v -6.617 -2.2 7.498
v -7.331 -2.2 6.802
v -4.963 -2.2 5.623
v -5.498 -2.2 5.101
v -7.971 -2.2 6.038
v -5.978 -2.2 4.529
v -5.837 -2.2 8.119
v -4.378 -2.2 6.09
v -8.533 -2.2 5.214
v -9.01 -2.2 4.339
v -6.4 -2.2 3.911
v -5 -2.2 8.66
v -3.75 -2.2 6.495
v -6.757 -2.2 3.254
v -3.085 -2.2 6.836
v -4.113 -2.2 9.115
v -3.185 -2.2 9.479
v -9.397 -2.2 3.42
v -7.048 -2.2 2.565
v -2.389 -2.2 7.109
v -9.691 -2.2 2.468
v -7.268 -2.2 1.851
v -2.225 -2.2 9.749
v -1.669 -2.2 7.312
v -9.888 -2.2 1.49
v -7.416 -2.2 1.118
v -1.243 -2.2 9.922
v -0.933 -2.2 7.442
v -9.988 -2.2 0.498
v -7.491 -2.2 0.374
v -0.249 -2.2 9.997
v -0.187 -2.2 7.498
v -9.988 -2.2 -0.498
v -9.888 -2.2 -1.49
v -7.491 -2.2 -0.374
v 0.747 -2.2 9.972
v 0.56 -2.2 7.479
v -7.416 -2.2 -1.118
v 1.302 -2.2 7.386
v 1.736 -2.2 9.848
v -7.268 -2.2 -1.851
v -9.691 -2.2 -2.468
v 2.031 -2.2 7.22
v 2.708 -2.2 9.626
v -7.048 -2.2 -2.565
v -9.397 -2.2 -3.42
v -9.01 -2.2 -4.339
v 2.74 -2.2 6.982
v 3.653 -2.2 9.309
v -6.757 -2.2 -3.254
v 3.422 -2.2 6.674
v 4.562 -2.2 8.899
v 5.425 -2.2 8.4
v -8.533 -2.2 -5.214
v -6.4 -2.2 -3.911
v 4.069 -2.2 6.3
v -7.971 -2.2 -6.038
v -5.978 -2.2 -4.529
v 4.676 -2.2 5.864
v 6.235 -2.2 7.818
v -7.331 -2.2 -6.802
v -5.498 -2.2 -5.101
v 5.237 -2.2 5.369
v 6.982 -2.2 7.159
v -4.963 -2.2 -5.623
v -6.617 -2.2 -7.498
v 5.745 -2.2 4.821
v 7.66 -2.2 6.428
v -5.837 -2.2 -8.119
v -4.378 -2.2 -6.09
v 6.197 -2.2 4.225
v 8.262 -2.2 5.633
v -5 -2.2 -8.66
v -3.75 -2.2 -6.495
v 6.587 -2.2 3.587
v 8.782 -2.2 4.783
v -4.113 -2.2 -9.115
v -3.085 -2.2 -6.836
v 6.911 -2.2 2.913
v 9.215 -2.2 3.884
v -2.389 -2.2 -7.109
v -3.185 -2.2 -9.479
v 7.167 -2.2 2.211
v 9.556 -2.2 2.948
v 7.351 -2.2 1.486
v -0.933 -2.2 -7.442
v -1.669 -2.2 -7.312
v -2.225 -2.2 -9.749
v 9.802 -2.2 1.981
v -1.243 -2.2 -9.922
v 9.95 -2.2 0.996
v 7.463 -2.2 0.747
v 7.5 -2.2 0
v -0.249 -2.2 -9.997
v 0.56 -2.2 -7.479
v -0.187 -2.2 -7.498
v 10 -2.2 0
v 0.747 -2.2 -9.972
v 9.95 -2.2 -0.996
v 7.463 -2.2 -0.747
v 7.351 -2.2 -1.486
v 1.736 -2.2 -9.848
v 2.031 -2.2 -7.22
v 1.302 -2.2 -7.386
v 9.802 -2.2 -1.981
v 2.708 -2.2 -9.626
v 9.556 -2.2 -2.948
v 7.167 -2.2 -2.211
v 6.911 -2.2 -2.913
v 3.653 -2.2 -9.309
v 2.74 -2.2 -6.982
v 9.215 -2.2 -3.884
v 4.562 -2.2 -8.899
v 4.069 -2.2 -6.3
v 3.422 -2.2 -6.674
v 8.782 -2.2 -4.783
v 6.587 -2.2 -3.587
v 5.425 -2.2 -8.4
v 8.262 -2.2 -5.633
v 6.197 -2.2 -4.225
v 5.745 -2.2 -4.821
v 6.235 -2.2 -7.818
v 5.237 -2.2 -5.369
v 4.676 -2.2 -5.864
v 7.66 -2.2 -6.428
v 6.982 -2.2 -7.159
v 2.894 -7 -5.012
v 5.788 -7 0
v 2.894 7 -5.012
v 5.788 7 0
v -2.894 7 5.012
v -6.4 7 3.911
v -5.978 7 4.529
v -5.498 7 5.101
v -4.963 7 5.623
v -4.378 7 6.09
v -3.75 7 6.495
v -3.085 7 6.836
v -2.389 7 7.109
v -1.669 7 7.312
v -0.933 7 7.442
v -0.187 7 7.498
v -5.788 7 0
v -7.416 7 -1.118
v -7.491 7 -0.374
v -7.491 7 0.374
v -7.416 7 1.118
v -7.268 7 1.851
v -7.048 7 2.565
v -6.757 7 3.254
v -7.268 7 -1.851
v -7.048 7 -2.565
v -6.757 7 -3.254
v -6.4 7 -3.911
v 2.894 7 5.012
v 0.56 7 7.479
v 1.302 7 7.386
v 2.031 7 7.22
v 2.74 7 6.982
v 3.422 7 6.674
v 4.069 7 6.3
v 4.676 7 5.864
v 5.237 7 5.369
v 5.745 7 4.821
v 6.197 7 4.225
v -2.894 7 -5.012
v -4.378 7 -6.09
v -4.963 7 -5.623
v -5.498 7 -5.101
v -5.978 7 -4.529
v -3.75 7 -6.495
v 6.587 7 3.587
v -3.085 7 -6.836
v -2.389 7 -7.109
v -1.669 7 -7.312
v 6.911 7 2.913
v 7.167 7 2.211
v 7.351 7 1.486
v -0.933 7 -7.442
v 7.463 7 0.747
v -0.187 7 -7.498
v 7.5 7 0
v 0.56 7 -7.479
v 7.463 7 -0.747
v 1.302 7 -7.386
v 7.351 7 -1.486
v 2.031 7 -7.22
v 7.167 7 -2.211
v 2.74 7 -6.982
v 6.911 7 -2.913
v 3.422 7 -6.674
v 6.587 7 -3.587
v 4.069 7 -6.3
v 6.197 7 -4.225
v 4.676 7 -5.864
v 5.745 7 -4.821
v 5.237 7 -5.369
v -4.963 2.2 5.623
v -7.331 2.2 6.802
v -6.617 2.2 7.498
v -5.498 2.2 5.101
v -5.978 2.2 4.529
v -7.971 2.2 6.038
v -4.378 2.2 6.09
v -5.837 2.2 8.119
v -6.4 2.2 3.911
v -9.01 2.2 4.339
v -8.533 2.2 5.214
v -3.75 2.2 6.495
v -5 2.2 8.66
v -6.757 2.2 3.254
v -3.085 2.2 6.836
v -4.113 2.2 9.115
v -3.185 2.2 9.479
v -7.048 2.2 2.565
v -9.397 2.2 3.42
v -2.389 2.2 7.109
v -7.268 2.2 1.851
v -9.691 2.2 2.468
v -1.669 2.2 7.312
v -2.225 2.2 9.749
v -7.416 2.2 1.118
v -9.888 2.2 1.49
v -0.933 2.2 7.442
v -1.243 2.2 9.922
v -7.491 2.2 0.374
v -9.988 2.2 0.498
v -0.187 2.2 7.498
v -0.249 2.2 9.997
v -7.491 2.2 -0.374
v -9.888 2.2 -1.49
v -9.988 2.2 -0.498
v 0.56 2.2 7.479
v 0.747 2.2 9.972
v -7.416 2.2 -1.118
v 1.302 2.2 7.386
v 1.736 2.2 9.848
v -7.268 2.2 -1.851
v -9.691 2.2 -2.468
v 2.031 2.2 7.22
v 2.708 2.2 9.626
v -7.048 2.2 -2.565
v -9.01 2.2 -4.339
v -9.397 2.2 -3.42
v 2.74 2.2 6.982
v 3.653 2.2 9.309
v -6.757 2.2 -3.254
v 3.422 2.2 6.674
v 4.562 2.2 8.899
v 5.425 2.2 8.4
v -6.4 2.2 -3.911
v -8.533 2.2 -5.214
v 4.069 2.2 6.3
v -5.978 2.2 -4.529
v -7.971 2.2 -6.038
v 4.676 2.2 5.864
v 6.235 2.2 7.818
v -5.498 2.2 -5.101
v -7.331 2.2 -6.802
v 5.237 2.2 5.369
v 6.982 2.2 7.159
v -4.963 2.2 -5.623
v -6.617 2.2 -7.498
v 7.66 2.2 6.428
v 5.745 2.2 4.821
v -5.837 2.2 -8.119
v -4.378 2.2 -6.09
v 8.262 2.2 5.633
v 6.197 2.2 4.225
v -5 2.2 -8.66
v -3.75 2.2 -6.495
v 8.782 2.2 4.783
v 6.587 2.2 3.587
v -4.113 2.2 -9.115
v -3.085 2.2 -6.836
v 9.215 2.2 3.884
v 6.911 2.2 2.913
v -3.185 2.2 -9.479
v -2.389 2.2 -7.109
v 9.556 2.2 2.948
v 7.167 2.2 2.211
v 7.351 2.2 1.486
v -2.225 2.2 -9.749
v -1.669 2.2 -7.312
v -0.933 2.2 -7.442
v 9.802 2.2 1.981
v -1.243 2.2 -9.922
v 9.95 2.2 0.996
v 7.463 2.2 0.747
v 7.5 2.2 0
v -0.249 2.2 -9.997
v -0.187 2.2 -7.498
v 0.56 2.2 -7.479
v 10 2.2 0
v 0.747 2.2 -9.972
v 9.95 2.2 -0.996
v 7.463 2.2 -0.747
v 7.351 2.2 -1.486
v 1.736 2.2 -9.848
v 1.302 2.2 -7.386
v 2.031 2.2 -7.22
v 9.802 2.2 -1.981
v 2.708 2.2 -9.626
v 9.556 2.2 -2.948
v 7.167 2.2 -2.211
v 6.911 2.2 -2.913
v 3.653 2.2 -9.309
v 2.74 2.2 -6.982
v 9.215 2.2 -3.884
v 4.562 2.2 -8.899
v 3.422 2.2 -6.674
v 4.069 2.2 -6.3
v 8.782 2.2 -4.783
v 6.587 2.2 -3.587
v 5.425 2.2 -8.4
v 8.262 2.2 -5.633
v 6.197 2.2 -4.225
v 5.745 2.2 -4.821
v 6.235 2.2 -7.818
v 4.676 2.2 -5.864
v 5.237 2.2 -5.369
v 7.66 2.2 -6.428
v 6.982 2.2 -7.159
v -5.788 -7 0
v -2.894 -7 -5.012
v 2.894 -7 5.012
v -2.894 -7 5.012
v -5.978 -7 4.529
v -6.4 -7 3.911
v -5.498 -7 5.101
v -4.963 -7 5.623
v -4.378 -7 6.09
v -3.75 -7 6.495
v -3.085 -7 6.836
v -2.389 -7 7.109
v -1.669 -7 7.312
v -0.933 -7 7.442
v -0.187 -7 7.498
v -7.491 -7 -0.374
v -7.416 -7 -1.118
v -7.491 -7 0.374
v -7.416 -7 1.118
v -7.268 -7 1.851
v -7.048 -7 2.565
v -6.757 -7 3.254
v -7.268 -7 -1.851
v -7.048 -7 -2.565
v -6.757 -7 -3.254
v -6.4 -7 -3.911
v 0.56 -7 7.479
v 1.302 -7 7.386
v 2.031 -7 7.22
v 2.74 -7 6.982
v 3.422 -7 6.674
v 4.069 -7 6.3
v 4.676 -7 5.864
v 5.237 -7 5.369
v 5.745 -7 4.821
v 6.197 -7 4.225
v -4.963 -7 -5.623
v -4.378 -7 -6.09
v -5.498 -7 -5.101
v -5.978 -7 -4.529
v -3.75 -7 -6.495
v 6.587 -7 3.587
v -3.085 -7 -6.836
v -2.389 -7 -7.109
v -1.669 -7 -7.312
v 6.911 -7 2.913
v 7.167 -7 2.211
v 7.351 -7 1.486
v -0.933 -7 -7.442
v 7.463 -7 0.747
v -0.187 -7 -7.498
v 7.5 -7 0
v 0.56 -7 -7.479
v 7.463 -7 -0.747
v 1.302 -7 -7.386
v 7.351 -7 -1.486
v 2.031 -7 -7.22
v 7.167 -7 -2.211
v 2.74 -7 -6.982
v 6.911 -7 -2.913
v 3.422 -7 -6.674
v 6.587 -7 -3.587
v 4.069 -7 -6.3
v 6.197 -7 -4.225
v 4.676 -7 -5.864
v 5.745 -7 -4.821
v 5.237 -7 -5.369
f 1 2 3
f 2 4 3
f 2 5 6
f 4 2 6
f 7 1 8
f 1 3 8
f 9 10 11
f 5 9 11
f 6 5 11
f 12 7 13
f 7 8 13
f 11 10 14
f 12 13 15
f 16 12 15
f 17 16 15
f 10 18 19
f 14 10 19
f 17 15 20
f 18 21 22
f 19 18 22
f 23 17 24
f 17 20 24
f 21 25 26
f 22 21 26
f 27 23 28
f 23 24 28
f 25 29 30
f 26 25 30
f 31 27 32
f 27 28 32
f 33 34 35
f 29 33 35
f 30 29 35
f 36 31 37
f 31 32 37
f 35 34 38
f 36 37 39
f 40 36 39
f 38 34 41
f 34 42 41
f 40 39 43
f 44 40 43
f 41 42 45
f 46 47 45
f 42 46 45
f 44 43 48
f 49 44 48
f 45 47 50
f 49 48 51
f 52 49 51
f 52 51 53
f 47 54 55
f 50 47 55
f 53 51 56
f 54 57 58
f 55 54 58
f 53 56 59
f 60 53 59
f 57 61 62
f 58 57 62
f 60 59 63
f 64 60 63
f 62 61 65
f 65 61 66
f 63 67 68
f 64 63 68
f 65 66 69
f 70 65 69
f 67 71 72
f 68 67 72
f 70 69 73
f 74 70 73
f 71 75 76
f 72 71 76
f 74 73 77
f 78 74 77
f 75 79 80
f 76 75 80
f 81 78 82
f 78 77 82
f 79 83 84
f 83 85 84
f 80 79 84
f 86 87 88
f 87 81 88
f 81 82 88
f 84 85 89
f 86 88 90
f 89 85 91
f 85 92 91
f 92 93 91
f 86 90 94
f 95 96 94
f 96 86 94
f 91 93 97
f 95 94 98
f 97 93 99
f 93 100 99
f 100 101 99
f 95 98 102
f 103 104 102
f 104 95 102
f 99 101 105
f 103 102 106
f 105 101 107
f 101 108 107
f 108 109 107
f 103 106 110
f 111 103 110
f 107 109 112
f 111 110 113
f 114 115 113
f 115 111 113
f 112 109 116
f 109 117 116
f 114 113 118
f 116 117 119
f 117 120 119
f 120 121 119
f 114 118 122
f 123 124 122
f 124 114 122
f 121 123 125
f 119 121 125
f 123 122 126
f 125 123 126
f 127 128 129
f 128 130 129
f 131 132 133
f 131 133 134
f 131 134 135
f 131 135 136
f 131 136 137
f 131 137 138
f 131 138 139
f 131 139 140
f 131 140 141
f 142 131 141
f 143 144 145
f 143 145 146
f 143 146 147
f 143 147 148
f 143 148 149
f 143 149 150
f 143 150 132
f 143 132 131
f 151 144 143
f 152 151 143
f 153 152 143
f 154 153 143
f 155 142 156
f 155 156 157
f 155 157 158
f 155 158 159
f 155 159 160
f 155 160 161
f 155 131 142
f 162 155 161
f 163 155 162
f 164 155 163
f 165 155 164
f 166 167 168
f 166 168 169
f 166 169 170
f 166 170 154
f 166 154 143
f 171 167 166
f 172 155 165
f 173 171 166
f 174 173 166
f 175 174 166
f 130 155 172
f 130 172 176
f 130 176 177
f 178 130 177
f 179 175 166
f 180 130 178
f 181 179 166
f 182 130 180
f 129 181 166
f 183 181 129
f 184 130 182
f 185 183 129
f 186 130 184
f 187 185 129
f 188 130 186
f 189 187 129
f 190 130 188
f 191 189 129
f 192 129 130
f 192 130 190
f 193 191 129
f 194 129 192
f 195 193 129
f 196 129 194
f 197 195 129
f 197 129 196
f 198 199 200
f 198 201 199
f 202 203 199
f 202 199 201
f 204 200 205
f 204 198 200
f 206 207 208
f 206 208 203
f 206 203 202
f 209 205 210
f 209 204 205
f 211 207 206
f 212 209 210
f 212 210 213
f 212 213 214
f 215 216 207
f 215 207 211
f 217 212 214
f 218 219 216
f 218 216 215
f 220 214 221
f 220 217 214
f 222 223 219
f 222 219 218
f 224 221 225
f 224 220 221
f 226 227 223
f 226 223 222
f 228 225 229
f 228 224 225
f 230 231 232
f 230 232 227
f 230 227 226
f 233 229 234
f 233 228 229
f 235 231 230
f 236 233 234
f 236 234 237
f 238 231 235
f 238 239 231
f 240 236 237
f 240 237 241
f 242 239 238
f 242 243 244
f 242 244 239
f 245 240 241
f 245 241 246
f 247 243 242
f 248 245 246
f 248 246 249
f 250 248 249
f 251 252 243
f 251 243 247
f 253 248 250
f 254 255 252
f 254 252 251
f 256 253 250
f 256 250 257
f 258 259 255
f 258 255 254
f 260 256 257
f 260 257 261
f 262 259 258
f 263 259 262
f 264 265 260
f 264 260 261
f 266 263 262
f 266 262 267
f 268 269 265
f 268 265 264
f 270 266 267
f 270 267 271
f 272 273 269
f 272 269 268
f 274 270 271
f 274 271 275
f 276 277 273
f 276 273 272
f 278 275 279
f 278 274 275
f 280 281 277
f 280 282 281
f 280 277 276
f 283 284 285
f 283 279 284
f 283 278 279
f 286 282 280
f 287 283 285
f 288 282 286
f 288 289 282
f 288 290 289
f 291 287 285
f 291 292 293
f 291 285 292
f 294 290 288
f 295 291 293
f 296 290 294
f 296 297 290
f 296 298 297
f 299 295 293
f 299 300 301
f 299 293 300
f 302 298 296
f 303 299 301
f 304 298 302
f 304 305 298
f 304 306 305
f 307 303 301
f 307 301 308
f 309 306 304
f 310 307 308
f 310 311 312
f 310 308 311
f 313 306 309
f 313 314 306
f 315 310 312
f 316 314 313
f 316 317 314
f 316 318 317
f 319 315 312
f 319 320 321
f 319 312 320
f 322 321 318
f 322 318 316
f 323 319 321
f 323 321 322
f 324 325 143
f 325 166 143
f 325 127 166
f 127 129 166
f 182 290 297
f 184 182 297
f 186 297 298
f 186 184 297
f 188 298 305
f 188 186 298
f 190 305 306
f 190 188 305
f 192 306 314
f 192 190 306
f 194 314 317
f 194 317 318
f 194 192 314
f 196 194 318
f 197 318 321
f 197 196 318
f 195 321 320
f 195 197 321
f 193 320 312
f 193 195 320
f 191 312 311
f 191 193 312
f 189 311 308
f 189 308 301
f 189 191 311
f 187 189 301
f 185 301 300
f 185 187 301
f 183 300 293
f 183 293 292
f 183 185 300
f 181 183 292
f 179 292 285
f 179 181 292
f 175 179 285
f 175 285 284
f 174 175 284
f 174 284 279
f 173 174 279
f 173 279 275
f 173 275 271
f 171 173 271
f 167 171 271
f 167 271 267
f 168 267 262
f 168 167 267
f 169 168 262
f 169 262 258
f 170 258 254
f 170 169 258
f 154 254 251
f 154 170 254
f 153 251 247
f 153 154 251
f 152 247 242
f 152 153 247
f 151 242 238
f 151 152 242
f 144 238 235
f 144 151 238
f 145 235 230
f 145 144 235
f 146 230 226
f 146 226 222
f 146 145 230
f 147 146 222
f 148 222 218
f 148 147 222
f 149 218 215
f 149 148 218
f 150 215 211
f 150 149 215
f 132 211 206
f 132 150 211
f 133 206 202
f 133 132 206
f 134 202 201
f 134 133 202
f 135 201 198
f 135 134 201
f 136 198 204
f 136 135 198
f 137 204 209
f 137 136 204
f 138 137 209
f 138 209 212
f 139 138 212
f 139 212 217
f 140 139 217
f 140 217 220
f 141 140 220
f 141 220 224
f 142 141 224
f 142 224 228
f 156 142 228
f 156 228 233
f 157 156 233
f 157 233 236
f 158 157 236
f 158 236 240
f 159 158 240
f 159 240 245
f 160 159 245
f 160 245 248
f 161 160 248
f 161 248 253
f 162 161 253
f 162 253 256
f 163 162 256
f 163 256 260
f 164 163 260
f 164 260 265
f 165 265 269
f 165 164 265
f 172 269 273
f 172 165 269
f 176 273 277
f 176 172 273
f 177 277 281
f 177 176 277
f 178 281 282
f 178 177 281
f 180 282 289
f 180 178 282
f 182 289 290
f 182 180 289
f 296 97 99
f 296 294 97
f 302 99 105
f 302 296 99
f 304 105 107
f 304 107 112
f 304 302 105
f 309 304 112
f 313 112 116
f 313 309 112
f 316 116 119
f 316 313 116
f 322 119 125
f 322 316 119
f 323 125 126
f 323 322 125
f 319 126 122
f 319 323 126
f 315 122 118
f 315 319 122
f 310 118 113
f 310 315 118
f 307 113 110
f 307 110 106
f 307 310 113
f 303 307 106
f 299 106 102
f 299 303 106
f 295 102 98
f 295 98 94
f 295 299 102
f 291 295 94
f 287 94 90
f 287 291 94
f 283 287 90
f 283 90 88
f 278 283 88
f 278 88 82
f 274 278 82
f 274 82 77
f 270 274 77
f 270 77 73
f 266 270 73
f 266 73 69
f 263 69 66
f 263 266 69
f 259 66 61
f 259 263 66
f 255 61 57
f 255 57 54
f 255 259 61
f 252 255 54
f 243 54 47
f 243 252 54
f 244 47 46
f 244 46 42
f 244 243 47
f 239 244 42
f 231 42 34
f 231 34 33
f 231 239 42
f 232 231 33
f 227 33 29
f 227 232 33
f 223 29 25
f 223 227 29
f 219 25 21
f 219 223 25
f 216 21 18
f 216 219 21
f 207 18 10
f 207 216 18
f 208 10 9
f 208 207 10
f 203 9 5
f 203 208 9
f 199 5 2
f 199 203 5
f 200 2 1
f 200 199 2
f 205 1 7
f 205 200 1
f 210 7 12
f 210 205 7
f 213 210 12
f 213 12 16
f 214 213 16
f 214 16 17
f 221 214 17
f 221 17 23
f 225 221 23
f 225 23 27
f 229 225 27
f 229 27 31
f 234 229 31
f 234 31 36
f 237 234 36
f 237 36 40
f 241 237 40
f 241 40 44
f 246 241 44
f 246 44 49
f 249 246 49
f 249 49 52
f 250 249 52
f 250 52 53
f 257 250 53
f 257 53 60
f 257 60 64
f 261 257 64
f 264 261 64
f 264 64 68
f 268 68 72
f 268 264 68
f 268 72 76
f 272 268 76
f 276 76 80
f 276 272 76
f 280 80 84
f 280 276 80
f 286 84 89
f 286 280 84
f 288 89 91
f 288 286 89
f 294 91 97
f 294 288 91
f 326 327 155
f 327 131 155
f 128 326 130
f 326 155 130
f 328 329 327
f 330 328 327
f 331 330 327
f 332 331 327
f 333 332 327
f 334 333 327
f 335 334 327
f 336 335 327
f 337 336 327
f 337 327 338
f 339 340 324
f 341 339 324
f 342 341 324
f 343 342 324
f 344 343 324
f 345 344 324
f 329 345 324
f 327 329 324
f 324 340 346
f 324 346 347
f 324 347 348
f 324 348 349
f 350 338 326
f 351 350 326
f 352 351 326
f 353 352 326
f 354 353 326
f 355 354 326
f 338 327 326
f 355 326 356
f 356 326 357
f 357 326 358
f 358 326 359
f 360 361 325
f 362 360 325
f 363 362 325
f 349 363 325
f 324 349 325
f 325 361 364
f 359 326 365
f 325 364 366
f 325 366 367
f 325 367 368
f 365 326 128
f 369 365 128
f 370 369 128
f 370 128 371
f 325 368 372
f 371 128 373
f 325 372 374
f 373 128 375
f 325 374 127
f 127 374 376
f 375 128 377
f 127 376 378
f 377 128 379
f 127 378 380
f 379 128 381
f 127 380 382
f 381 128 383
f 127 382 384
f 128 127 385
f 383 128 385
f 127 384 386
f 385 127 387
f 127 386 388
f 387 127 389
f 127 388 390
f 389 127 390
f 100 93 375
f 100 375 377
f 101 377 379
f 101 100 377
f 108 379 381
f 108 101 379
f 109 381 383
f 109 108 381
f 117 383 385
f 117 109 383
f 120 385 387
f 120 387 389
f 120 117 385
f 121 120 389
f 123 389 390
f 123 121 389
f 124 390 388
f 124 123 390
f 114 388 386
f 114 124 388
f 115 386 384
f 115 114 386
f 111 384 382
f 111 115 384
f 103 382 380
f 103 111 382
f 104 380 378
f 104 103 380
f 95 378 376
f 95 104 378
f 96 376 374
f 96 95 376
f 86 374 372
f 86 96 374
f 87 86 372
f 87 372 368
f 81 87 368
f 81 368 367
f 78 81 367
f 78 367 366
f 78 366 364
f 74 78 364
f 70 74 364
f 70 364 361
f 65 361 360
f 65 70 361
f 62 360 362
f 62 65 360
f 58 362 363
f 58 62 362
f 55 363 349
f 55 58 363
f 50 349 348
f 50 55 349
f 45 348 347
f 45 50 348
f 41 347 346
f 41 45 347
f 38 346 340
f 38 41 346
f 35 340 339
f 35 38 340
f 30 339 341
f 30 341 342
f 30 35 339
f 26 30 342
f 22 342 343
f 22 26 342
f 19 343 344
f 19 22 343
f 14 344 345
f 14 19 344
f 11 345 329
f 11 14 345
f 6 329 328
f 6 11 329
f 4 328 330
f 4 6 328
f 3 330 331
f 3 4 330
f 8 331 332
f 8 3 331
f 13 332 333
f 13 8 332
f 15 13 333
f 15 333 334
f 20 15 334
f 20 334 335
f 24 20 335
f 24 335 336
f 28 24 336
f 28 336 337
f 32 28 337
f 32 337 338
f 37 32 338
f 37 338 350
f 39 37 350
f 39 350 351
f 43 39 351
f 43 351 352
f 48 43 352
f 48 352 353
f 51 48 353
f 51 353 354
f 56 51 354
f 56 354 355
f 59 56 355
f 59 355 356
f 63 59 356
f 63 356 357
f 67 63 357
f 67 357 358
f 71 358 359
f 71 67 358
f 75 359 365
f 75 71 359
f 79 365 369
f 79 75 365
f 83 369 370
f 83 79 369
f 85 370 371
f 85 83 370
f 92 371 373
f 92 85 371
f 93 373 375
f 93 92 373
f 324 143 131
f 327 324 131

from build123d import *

# Parameters (mm, degrees)
SKETCH1_R           = 7.5
BOSS_EXTRUDE1_DEPTH = 7
SKETCH1_3_R         = 10
BOSS_EXTRUDE2_DEPTH = 2.2


with BuildPart() as part:
    # Sketch1 → Boss-Extrude1 (new, symmetric)
    with BuildSketch(Plane(origin=(0, 0, 0), x_dir=(1, 0, 0), z_dir=(0, 1, 0))):
        Circle(SKETCH1_R)
        Polygon((2.893968224, -5.0125), (-2.893968224, -5.0125), (-5.787936449, 0), (-2.893968224, 5.0125), (2.893968224, 5.0125), (5.787936449, 0), align=None, mode=Mode.SUBTRACT)
    extrude(amount=BOSS_EXTRUDE1_DEPTH, both=True)

    # Sketch1<3> → Boss-Extrude2 (add, symmetric)
    with BuildSketch(Plane(origin=(0, 0, 0), x_dir=(1, 0, 0), z_dir=(0, 1, 0))):
        Circle(SKETCH1_3_R)
        Polygon((2.893968224, -5.0125), (-2.893968224, -5.0125), (-5.787936449, 0), (-2.893968224, 5.0125), (2.893968224, 5.0125), (5.787936449, 0), align=None, mode=Mode.SUBTRACT)
    extrude(amount=BOSS_EXTRUDE2_DEPTH, both=True)


solid = part.part
